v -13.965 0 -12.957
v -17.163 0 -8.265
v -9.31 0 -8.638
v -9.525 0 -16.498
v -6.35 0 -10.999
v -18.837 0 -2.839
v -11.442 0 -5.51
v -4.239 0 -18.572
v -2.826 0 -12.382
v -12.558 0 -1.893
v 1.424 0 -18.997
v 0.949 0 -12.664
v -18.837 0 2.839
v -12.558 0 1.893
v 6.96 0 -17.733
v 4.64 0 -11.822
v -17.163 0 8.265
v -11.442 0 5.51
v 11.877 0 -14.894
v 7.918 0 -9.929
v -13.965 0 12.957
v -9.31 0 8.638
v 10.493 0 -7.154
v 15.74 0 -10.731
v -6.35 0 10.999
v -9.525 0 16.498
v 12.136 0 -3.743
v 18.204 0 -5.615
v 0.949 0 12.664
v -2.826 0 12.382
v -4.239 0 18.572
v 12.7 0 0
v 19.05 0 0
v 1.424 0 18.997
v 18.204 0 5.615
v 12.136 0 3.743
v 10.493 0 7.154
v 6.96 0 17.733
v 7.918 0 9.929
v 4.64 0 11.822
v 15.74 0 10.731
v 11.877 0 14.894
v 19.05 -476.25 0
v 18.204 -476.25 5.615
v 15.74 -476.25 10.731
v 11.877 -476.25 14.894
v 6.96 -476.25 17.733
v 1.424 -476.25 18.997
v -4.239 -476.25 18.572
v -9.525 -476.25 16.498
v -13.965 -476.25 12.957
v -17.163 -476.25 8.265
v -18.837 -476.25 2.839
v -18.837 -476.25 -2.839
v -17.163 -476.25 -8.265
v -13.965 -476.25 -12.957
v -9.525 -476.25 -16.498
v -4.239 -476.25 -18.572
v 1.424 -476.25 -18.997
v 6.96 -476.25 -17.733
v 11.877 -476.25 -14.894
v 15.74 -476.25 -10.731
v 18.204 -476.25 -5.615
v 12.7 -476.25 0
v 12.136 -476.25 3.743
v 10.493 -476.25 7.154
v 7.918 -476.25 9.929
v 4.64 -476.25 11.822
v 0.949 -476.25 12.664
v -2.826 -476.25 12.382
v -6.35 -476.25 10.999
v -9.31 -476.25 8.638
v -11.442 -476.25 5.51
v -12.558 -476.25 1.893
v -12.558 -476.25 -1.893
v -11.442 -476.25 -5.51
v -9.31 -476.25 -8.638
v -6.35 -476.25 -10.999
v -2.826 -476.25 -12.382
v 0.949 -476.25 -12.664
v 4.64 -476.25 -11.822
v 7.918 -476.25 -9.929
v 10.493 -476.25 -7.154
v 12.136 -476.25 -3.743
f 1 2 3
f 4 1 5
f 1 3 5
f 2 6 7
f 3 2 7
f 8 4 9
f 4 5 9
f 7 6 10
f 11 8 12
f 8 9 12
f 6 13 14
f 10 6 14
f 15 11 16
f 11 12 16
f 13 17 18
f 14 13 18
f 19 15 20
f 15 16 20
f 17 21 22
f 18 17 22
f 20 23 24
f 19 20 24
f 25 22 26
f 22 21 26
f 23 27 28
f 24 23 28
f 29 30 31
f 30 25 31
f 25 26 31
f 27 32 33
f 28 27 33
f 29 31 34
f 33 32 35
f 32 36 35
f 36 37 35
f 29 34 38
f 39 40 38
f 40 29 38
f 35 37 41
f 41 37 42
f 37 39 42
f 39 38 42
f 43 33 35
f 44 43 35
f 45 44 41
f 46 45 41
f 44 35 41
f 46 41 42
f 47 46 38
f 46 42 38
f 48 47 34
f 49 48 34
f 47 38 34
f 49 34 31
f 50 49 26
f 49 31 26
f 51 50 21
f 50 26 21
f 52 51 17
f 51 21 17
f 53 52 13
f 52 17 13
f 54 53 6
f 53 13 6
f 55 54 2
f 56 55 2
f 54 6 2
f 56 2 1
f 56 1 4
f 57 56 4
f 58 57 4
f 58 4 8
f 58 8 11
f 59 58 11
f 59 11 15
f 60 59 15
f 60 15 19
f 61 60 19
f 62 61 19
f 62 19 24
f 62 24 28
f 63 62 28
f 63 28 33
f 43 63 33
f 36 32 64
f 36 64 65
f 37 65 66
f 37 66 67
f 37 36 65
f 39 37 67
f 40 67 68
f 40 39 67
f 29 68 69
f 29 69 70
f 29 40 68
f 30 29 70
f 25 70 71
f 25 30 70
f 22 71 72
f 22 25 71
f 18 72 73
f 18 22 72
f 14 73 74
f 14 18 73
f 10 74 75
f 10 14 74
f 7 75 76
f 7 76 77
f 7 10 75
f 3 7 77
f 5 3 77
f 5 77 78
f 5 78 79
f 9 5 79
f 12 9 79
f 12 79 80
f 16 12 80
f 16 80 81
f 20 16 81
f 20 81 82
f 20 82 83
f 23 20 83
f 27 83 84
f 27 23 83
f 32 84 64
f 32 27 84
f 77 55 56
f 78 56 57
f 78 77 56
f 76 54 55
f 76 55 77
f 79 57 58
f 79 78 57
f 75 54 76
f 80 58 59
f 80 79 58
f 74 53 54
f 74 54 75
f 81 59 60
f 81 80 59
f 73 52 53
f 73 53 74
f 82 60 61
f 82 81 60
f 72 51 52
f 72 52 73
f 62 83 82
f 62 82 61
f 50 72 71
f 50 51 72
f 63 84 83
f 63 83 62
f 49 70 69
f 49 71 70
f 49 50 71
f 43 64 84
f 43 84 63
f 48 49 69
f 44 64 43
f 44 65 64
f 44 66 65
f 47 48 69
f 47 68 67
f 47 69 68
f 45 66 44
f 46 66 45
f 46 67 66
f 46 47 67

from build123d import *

# Parameters (mm, degrees)
CYLINDER_R          = 12.7
CYLINDER_DEPTH      = 476.25
CYLINDER_ROLL_ANGLE = 90
THICKNESS001_T      = 6.35


with BuildPart() as part:
    # Cylinder → Cylinder (new body)
    with BuildSketch(Plane.XY):
        Circle(CYLINDER_R)
    extrude(amount=CYLINDER_DEPTH)


with BuildPart() as part_1:
    # Cylinder roll: moved
    add(part.part.rotate(Axis((0, 0, 0), (1, 0, 0)), CYLINDER_ROLL_ANGLE))


with BuildPart() as part_2:
    # Cylinder placement: moved
    add(part_1.part)

    # Thickness001
    thickness001_openings = [part_2.faces().sort_by_distance(p)[0] for p in [
        (0, 0, 0),
        (0, -476.25, 0),
    ]]
    offset(amount=THICKNESS001_T, openings=thickness001_openings)


solid = part_2.part
